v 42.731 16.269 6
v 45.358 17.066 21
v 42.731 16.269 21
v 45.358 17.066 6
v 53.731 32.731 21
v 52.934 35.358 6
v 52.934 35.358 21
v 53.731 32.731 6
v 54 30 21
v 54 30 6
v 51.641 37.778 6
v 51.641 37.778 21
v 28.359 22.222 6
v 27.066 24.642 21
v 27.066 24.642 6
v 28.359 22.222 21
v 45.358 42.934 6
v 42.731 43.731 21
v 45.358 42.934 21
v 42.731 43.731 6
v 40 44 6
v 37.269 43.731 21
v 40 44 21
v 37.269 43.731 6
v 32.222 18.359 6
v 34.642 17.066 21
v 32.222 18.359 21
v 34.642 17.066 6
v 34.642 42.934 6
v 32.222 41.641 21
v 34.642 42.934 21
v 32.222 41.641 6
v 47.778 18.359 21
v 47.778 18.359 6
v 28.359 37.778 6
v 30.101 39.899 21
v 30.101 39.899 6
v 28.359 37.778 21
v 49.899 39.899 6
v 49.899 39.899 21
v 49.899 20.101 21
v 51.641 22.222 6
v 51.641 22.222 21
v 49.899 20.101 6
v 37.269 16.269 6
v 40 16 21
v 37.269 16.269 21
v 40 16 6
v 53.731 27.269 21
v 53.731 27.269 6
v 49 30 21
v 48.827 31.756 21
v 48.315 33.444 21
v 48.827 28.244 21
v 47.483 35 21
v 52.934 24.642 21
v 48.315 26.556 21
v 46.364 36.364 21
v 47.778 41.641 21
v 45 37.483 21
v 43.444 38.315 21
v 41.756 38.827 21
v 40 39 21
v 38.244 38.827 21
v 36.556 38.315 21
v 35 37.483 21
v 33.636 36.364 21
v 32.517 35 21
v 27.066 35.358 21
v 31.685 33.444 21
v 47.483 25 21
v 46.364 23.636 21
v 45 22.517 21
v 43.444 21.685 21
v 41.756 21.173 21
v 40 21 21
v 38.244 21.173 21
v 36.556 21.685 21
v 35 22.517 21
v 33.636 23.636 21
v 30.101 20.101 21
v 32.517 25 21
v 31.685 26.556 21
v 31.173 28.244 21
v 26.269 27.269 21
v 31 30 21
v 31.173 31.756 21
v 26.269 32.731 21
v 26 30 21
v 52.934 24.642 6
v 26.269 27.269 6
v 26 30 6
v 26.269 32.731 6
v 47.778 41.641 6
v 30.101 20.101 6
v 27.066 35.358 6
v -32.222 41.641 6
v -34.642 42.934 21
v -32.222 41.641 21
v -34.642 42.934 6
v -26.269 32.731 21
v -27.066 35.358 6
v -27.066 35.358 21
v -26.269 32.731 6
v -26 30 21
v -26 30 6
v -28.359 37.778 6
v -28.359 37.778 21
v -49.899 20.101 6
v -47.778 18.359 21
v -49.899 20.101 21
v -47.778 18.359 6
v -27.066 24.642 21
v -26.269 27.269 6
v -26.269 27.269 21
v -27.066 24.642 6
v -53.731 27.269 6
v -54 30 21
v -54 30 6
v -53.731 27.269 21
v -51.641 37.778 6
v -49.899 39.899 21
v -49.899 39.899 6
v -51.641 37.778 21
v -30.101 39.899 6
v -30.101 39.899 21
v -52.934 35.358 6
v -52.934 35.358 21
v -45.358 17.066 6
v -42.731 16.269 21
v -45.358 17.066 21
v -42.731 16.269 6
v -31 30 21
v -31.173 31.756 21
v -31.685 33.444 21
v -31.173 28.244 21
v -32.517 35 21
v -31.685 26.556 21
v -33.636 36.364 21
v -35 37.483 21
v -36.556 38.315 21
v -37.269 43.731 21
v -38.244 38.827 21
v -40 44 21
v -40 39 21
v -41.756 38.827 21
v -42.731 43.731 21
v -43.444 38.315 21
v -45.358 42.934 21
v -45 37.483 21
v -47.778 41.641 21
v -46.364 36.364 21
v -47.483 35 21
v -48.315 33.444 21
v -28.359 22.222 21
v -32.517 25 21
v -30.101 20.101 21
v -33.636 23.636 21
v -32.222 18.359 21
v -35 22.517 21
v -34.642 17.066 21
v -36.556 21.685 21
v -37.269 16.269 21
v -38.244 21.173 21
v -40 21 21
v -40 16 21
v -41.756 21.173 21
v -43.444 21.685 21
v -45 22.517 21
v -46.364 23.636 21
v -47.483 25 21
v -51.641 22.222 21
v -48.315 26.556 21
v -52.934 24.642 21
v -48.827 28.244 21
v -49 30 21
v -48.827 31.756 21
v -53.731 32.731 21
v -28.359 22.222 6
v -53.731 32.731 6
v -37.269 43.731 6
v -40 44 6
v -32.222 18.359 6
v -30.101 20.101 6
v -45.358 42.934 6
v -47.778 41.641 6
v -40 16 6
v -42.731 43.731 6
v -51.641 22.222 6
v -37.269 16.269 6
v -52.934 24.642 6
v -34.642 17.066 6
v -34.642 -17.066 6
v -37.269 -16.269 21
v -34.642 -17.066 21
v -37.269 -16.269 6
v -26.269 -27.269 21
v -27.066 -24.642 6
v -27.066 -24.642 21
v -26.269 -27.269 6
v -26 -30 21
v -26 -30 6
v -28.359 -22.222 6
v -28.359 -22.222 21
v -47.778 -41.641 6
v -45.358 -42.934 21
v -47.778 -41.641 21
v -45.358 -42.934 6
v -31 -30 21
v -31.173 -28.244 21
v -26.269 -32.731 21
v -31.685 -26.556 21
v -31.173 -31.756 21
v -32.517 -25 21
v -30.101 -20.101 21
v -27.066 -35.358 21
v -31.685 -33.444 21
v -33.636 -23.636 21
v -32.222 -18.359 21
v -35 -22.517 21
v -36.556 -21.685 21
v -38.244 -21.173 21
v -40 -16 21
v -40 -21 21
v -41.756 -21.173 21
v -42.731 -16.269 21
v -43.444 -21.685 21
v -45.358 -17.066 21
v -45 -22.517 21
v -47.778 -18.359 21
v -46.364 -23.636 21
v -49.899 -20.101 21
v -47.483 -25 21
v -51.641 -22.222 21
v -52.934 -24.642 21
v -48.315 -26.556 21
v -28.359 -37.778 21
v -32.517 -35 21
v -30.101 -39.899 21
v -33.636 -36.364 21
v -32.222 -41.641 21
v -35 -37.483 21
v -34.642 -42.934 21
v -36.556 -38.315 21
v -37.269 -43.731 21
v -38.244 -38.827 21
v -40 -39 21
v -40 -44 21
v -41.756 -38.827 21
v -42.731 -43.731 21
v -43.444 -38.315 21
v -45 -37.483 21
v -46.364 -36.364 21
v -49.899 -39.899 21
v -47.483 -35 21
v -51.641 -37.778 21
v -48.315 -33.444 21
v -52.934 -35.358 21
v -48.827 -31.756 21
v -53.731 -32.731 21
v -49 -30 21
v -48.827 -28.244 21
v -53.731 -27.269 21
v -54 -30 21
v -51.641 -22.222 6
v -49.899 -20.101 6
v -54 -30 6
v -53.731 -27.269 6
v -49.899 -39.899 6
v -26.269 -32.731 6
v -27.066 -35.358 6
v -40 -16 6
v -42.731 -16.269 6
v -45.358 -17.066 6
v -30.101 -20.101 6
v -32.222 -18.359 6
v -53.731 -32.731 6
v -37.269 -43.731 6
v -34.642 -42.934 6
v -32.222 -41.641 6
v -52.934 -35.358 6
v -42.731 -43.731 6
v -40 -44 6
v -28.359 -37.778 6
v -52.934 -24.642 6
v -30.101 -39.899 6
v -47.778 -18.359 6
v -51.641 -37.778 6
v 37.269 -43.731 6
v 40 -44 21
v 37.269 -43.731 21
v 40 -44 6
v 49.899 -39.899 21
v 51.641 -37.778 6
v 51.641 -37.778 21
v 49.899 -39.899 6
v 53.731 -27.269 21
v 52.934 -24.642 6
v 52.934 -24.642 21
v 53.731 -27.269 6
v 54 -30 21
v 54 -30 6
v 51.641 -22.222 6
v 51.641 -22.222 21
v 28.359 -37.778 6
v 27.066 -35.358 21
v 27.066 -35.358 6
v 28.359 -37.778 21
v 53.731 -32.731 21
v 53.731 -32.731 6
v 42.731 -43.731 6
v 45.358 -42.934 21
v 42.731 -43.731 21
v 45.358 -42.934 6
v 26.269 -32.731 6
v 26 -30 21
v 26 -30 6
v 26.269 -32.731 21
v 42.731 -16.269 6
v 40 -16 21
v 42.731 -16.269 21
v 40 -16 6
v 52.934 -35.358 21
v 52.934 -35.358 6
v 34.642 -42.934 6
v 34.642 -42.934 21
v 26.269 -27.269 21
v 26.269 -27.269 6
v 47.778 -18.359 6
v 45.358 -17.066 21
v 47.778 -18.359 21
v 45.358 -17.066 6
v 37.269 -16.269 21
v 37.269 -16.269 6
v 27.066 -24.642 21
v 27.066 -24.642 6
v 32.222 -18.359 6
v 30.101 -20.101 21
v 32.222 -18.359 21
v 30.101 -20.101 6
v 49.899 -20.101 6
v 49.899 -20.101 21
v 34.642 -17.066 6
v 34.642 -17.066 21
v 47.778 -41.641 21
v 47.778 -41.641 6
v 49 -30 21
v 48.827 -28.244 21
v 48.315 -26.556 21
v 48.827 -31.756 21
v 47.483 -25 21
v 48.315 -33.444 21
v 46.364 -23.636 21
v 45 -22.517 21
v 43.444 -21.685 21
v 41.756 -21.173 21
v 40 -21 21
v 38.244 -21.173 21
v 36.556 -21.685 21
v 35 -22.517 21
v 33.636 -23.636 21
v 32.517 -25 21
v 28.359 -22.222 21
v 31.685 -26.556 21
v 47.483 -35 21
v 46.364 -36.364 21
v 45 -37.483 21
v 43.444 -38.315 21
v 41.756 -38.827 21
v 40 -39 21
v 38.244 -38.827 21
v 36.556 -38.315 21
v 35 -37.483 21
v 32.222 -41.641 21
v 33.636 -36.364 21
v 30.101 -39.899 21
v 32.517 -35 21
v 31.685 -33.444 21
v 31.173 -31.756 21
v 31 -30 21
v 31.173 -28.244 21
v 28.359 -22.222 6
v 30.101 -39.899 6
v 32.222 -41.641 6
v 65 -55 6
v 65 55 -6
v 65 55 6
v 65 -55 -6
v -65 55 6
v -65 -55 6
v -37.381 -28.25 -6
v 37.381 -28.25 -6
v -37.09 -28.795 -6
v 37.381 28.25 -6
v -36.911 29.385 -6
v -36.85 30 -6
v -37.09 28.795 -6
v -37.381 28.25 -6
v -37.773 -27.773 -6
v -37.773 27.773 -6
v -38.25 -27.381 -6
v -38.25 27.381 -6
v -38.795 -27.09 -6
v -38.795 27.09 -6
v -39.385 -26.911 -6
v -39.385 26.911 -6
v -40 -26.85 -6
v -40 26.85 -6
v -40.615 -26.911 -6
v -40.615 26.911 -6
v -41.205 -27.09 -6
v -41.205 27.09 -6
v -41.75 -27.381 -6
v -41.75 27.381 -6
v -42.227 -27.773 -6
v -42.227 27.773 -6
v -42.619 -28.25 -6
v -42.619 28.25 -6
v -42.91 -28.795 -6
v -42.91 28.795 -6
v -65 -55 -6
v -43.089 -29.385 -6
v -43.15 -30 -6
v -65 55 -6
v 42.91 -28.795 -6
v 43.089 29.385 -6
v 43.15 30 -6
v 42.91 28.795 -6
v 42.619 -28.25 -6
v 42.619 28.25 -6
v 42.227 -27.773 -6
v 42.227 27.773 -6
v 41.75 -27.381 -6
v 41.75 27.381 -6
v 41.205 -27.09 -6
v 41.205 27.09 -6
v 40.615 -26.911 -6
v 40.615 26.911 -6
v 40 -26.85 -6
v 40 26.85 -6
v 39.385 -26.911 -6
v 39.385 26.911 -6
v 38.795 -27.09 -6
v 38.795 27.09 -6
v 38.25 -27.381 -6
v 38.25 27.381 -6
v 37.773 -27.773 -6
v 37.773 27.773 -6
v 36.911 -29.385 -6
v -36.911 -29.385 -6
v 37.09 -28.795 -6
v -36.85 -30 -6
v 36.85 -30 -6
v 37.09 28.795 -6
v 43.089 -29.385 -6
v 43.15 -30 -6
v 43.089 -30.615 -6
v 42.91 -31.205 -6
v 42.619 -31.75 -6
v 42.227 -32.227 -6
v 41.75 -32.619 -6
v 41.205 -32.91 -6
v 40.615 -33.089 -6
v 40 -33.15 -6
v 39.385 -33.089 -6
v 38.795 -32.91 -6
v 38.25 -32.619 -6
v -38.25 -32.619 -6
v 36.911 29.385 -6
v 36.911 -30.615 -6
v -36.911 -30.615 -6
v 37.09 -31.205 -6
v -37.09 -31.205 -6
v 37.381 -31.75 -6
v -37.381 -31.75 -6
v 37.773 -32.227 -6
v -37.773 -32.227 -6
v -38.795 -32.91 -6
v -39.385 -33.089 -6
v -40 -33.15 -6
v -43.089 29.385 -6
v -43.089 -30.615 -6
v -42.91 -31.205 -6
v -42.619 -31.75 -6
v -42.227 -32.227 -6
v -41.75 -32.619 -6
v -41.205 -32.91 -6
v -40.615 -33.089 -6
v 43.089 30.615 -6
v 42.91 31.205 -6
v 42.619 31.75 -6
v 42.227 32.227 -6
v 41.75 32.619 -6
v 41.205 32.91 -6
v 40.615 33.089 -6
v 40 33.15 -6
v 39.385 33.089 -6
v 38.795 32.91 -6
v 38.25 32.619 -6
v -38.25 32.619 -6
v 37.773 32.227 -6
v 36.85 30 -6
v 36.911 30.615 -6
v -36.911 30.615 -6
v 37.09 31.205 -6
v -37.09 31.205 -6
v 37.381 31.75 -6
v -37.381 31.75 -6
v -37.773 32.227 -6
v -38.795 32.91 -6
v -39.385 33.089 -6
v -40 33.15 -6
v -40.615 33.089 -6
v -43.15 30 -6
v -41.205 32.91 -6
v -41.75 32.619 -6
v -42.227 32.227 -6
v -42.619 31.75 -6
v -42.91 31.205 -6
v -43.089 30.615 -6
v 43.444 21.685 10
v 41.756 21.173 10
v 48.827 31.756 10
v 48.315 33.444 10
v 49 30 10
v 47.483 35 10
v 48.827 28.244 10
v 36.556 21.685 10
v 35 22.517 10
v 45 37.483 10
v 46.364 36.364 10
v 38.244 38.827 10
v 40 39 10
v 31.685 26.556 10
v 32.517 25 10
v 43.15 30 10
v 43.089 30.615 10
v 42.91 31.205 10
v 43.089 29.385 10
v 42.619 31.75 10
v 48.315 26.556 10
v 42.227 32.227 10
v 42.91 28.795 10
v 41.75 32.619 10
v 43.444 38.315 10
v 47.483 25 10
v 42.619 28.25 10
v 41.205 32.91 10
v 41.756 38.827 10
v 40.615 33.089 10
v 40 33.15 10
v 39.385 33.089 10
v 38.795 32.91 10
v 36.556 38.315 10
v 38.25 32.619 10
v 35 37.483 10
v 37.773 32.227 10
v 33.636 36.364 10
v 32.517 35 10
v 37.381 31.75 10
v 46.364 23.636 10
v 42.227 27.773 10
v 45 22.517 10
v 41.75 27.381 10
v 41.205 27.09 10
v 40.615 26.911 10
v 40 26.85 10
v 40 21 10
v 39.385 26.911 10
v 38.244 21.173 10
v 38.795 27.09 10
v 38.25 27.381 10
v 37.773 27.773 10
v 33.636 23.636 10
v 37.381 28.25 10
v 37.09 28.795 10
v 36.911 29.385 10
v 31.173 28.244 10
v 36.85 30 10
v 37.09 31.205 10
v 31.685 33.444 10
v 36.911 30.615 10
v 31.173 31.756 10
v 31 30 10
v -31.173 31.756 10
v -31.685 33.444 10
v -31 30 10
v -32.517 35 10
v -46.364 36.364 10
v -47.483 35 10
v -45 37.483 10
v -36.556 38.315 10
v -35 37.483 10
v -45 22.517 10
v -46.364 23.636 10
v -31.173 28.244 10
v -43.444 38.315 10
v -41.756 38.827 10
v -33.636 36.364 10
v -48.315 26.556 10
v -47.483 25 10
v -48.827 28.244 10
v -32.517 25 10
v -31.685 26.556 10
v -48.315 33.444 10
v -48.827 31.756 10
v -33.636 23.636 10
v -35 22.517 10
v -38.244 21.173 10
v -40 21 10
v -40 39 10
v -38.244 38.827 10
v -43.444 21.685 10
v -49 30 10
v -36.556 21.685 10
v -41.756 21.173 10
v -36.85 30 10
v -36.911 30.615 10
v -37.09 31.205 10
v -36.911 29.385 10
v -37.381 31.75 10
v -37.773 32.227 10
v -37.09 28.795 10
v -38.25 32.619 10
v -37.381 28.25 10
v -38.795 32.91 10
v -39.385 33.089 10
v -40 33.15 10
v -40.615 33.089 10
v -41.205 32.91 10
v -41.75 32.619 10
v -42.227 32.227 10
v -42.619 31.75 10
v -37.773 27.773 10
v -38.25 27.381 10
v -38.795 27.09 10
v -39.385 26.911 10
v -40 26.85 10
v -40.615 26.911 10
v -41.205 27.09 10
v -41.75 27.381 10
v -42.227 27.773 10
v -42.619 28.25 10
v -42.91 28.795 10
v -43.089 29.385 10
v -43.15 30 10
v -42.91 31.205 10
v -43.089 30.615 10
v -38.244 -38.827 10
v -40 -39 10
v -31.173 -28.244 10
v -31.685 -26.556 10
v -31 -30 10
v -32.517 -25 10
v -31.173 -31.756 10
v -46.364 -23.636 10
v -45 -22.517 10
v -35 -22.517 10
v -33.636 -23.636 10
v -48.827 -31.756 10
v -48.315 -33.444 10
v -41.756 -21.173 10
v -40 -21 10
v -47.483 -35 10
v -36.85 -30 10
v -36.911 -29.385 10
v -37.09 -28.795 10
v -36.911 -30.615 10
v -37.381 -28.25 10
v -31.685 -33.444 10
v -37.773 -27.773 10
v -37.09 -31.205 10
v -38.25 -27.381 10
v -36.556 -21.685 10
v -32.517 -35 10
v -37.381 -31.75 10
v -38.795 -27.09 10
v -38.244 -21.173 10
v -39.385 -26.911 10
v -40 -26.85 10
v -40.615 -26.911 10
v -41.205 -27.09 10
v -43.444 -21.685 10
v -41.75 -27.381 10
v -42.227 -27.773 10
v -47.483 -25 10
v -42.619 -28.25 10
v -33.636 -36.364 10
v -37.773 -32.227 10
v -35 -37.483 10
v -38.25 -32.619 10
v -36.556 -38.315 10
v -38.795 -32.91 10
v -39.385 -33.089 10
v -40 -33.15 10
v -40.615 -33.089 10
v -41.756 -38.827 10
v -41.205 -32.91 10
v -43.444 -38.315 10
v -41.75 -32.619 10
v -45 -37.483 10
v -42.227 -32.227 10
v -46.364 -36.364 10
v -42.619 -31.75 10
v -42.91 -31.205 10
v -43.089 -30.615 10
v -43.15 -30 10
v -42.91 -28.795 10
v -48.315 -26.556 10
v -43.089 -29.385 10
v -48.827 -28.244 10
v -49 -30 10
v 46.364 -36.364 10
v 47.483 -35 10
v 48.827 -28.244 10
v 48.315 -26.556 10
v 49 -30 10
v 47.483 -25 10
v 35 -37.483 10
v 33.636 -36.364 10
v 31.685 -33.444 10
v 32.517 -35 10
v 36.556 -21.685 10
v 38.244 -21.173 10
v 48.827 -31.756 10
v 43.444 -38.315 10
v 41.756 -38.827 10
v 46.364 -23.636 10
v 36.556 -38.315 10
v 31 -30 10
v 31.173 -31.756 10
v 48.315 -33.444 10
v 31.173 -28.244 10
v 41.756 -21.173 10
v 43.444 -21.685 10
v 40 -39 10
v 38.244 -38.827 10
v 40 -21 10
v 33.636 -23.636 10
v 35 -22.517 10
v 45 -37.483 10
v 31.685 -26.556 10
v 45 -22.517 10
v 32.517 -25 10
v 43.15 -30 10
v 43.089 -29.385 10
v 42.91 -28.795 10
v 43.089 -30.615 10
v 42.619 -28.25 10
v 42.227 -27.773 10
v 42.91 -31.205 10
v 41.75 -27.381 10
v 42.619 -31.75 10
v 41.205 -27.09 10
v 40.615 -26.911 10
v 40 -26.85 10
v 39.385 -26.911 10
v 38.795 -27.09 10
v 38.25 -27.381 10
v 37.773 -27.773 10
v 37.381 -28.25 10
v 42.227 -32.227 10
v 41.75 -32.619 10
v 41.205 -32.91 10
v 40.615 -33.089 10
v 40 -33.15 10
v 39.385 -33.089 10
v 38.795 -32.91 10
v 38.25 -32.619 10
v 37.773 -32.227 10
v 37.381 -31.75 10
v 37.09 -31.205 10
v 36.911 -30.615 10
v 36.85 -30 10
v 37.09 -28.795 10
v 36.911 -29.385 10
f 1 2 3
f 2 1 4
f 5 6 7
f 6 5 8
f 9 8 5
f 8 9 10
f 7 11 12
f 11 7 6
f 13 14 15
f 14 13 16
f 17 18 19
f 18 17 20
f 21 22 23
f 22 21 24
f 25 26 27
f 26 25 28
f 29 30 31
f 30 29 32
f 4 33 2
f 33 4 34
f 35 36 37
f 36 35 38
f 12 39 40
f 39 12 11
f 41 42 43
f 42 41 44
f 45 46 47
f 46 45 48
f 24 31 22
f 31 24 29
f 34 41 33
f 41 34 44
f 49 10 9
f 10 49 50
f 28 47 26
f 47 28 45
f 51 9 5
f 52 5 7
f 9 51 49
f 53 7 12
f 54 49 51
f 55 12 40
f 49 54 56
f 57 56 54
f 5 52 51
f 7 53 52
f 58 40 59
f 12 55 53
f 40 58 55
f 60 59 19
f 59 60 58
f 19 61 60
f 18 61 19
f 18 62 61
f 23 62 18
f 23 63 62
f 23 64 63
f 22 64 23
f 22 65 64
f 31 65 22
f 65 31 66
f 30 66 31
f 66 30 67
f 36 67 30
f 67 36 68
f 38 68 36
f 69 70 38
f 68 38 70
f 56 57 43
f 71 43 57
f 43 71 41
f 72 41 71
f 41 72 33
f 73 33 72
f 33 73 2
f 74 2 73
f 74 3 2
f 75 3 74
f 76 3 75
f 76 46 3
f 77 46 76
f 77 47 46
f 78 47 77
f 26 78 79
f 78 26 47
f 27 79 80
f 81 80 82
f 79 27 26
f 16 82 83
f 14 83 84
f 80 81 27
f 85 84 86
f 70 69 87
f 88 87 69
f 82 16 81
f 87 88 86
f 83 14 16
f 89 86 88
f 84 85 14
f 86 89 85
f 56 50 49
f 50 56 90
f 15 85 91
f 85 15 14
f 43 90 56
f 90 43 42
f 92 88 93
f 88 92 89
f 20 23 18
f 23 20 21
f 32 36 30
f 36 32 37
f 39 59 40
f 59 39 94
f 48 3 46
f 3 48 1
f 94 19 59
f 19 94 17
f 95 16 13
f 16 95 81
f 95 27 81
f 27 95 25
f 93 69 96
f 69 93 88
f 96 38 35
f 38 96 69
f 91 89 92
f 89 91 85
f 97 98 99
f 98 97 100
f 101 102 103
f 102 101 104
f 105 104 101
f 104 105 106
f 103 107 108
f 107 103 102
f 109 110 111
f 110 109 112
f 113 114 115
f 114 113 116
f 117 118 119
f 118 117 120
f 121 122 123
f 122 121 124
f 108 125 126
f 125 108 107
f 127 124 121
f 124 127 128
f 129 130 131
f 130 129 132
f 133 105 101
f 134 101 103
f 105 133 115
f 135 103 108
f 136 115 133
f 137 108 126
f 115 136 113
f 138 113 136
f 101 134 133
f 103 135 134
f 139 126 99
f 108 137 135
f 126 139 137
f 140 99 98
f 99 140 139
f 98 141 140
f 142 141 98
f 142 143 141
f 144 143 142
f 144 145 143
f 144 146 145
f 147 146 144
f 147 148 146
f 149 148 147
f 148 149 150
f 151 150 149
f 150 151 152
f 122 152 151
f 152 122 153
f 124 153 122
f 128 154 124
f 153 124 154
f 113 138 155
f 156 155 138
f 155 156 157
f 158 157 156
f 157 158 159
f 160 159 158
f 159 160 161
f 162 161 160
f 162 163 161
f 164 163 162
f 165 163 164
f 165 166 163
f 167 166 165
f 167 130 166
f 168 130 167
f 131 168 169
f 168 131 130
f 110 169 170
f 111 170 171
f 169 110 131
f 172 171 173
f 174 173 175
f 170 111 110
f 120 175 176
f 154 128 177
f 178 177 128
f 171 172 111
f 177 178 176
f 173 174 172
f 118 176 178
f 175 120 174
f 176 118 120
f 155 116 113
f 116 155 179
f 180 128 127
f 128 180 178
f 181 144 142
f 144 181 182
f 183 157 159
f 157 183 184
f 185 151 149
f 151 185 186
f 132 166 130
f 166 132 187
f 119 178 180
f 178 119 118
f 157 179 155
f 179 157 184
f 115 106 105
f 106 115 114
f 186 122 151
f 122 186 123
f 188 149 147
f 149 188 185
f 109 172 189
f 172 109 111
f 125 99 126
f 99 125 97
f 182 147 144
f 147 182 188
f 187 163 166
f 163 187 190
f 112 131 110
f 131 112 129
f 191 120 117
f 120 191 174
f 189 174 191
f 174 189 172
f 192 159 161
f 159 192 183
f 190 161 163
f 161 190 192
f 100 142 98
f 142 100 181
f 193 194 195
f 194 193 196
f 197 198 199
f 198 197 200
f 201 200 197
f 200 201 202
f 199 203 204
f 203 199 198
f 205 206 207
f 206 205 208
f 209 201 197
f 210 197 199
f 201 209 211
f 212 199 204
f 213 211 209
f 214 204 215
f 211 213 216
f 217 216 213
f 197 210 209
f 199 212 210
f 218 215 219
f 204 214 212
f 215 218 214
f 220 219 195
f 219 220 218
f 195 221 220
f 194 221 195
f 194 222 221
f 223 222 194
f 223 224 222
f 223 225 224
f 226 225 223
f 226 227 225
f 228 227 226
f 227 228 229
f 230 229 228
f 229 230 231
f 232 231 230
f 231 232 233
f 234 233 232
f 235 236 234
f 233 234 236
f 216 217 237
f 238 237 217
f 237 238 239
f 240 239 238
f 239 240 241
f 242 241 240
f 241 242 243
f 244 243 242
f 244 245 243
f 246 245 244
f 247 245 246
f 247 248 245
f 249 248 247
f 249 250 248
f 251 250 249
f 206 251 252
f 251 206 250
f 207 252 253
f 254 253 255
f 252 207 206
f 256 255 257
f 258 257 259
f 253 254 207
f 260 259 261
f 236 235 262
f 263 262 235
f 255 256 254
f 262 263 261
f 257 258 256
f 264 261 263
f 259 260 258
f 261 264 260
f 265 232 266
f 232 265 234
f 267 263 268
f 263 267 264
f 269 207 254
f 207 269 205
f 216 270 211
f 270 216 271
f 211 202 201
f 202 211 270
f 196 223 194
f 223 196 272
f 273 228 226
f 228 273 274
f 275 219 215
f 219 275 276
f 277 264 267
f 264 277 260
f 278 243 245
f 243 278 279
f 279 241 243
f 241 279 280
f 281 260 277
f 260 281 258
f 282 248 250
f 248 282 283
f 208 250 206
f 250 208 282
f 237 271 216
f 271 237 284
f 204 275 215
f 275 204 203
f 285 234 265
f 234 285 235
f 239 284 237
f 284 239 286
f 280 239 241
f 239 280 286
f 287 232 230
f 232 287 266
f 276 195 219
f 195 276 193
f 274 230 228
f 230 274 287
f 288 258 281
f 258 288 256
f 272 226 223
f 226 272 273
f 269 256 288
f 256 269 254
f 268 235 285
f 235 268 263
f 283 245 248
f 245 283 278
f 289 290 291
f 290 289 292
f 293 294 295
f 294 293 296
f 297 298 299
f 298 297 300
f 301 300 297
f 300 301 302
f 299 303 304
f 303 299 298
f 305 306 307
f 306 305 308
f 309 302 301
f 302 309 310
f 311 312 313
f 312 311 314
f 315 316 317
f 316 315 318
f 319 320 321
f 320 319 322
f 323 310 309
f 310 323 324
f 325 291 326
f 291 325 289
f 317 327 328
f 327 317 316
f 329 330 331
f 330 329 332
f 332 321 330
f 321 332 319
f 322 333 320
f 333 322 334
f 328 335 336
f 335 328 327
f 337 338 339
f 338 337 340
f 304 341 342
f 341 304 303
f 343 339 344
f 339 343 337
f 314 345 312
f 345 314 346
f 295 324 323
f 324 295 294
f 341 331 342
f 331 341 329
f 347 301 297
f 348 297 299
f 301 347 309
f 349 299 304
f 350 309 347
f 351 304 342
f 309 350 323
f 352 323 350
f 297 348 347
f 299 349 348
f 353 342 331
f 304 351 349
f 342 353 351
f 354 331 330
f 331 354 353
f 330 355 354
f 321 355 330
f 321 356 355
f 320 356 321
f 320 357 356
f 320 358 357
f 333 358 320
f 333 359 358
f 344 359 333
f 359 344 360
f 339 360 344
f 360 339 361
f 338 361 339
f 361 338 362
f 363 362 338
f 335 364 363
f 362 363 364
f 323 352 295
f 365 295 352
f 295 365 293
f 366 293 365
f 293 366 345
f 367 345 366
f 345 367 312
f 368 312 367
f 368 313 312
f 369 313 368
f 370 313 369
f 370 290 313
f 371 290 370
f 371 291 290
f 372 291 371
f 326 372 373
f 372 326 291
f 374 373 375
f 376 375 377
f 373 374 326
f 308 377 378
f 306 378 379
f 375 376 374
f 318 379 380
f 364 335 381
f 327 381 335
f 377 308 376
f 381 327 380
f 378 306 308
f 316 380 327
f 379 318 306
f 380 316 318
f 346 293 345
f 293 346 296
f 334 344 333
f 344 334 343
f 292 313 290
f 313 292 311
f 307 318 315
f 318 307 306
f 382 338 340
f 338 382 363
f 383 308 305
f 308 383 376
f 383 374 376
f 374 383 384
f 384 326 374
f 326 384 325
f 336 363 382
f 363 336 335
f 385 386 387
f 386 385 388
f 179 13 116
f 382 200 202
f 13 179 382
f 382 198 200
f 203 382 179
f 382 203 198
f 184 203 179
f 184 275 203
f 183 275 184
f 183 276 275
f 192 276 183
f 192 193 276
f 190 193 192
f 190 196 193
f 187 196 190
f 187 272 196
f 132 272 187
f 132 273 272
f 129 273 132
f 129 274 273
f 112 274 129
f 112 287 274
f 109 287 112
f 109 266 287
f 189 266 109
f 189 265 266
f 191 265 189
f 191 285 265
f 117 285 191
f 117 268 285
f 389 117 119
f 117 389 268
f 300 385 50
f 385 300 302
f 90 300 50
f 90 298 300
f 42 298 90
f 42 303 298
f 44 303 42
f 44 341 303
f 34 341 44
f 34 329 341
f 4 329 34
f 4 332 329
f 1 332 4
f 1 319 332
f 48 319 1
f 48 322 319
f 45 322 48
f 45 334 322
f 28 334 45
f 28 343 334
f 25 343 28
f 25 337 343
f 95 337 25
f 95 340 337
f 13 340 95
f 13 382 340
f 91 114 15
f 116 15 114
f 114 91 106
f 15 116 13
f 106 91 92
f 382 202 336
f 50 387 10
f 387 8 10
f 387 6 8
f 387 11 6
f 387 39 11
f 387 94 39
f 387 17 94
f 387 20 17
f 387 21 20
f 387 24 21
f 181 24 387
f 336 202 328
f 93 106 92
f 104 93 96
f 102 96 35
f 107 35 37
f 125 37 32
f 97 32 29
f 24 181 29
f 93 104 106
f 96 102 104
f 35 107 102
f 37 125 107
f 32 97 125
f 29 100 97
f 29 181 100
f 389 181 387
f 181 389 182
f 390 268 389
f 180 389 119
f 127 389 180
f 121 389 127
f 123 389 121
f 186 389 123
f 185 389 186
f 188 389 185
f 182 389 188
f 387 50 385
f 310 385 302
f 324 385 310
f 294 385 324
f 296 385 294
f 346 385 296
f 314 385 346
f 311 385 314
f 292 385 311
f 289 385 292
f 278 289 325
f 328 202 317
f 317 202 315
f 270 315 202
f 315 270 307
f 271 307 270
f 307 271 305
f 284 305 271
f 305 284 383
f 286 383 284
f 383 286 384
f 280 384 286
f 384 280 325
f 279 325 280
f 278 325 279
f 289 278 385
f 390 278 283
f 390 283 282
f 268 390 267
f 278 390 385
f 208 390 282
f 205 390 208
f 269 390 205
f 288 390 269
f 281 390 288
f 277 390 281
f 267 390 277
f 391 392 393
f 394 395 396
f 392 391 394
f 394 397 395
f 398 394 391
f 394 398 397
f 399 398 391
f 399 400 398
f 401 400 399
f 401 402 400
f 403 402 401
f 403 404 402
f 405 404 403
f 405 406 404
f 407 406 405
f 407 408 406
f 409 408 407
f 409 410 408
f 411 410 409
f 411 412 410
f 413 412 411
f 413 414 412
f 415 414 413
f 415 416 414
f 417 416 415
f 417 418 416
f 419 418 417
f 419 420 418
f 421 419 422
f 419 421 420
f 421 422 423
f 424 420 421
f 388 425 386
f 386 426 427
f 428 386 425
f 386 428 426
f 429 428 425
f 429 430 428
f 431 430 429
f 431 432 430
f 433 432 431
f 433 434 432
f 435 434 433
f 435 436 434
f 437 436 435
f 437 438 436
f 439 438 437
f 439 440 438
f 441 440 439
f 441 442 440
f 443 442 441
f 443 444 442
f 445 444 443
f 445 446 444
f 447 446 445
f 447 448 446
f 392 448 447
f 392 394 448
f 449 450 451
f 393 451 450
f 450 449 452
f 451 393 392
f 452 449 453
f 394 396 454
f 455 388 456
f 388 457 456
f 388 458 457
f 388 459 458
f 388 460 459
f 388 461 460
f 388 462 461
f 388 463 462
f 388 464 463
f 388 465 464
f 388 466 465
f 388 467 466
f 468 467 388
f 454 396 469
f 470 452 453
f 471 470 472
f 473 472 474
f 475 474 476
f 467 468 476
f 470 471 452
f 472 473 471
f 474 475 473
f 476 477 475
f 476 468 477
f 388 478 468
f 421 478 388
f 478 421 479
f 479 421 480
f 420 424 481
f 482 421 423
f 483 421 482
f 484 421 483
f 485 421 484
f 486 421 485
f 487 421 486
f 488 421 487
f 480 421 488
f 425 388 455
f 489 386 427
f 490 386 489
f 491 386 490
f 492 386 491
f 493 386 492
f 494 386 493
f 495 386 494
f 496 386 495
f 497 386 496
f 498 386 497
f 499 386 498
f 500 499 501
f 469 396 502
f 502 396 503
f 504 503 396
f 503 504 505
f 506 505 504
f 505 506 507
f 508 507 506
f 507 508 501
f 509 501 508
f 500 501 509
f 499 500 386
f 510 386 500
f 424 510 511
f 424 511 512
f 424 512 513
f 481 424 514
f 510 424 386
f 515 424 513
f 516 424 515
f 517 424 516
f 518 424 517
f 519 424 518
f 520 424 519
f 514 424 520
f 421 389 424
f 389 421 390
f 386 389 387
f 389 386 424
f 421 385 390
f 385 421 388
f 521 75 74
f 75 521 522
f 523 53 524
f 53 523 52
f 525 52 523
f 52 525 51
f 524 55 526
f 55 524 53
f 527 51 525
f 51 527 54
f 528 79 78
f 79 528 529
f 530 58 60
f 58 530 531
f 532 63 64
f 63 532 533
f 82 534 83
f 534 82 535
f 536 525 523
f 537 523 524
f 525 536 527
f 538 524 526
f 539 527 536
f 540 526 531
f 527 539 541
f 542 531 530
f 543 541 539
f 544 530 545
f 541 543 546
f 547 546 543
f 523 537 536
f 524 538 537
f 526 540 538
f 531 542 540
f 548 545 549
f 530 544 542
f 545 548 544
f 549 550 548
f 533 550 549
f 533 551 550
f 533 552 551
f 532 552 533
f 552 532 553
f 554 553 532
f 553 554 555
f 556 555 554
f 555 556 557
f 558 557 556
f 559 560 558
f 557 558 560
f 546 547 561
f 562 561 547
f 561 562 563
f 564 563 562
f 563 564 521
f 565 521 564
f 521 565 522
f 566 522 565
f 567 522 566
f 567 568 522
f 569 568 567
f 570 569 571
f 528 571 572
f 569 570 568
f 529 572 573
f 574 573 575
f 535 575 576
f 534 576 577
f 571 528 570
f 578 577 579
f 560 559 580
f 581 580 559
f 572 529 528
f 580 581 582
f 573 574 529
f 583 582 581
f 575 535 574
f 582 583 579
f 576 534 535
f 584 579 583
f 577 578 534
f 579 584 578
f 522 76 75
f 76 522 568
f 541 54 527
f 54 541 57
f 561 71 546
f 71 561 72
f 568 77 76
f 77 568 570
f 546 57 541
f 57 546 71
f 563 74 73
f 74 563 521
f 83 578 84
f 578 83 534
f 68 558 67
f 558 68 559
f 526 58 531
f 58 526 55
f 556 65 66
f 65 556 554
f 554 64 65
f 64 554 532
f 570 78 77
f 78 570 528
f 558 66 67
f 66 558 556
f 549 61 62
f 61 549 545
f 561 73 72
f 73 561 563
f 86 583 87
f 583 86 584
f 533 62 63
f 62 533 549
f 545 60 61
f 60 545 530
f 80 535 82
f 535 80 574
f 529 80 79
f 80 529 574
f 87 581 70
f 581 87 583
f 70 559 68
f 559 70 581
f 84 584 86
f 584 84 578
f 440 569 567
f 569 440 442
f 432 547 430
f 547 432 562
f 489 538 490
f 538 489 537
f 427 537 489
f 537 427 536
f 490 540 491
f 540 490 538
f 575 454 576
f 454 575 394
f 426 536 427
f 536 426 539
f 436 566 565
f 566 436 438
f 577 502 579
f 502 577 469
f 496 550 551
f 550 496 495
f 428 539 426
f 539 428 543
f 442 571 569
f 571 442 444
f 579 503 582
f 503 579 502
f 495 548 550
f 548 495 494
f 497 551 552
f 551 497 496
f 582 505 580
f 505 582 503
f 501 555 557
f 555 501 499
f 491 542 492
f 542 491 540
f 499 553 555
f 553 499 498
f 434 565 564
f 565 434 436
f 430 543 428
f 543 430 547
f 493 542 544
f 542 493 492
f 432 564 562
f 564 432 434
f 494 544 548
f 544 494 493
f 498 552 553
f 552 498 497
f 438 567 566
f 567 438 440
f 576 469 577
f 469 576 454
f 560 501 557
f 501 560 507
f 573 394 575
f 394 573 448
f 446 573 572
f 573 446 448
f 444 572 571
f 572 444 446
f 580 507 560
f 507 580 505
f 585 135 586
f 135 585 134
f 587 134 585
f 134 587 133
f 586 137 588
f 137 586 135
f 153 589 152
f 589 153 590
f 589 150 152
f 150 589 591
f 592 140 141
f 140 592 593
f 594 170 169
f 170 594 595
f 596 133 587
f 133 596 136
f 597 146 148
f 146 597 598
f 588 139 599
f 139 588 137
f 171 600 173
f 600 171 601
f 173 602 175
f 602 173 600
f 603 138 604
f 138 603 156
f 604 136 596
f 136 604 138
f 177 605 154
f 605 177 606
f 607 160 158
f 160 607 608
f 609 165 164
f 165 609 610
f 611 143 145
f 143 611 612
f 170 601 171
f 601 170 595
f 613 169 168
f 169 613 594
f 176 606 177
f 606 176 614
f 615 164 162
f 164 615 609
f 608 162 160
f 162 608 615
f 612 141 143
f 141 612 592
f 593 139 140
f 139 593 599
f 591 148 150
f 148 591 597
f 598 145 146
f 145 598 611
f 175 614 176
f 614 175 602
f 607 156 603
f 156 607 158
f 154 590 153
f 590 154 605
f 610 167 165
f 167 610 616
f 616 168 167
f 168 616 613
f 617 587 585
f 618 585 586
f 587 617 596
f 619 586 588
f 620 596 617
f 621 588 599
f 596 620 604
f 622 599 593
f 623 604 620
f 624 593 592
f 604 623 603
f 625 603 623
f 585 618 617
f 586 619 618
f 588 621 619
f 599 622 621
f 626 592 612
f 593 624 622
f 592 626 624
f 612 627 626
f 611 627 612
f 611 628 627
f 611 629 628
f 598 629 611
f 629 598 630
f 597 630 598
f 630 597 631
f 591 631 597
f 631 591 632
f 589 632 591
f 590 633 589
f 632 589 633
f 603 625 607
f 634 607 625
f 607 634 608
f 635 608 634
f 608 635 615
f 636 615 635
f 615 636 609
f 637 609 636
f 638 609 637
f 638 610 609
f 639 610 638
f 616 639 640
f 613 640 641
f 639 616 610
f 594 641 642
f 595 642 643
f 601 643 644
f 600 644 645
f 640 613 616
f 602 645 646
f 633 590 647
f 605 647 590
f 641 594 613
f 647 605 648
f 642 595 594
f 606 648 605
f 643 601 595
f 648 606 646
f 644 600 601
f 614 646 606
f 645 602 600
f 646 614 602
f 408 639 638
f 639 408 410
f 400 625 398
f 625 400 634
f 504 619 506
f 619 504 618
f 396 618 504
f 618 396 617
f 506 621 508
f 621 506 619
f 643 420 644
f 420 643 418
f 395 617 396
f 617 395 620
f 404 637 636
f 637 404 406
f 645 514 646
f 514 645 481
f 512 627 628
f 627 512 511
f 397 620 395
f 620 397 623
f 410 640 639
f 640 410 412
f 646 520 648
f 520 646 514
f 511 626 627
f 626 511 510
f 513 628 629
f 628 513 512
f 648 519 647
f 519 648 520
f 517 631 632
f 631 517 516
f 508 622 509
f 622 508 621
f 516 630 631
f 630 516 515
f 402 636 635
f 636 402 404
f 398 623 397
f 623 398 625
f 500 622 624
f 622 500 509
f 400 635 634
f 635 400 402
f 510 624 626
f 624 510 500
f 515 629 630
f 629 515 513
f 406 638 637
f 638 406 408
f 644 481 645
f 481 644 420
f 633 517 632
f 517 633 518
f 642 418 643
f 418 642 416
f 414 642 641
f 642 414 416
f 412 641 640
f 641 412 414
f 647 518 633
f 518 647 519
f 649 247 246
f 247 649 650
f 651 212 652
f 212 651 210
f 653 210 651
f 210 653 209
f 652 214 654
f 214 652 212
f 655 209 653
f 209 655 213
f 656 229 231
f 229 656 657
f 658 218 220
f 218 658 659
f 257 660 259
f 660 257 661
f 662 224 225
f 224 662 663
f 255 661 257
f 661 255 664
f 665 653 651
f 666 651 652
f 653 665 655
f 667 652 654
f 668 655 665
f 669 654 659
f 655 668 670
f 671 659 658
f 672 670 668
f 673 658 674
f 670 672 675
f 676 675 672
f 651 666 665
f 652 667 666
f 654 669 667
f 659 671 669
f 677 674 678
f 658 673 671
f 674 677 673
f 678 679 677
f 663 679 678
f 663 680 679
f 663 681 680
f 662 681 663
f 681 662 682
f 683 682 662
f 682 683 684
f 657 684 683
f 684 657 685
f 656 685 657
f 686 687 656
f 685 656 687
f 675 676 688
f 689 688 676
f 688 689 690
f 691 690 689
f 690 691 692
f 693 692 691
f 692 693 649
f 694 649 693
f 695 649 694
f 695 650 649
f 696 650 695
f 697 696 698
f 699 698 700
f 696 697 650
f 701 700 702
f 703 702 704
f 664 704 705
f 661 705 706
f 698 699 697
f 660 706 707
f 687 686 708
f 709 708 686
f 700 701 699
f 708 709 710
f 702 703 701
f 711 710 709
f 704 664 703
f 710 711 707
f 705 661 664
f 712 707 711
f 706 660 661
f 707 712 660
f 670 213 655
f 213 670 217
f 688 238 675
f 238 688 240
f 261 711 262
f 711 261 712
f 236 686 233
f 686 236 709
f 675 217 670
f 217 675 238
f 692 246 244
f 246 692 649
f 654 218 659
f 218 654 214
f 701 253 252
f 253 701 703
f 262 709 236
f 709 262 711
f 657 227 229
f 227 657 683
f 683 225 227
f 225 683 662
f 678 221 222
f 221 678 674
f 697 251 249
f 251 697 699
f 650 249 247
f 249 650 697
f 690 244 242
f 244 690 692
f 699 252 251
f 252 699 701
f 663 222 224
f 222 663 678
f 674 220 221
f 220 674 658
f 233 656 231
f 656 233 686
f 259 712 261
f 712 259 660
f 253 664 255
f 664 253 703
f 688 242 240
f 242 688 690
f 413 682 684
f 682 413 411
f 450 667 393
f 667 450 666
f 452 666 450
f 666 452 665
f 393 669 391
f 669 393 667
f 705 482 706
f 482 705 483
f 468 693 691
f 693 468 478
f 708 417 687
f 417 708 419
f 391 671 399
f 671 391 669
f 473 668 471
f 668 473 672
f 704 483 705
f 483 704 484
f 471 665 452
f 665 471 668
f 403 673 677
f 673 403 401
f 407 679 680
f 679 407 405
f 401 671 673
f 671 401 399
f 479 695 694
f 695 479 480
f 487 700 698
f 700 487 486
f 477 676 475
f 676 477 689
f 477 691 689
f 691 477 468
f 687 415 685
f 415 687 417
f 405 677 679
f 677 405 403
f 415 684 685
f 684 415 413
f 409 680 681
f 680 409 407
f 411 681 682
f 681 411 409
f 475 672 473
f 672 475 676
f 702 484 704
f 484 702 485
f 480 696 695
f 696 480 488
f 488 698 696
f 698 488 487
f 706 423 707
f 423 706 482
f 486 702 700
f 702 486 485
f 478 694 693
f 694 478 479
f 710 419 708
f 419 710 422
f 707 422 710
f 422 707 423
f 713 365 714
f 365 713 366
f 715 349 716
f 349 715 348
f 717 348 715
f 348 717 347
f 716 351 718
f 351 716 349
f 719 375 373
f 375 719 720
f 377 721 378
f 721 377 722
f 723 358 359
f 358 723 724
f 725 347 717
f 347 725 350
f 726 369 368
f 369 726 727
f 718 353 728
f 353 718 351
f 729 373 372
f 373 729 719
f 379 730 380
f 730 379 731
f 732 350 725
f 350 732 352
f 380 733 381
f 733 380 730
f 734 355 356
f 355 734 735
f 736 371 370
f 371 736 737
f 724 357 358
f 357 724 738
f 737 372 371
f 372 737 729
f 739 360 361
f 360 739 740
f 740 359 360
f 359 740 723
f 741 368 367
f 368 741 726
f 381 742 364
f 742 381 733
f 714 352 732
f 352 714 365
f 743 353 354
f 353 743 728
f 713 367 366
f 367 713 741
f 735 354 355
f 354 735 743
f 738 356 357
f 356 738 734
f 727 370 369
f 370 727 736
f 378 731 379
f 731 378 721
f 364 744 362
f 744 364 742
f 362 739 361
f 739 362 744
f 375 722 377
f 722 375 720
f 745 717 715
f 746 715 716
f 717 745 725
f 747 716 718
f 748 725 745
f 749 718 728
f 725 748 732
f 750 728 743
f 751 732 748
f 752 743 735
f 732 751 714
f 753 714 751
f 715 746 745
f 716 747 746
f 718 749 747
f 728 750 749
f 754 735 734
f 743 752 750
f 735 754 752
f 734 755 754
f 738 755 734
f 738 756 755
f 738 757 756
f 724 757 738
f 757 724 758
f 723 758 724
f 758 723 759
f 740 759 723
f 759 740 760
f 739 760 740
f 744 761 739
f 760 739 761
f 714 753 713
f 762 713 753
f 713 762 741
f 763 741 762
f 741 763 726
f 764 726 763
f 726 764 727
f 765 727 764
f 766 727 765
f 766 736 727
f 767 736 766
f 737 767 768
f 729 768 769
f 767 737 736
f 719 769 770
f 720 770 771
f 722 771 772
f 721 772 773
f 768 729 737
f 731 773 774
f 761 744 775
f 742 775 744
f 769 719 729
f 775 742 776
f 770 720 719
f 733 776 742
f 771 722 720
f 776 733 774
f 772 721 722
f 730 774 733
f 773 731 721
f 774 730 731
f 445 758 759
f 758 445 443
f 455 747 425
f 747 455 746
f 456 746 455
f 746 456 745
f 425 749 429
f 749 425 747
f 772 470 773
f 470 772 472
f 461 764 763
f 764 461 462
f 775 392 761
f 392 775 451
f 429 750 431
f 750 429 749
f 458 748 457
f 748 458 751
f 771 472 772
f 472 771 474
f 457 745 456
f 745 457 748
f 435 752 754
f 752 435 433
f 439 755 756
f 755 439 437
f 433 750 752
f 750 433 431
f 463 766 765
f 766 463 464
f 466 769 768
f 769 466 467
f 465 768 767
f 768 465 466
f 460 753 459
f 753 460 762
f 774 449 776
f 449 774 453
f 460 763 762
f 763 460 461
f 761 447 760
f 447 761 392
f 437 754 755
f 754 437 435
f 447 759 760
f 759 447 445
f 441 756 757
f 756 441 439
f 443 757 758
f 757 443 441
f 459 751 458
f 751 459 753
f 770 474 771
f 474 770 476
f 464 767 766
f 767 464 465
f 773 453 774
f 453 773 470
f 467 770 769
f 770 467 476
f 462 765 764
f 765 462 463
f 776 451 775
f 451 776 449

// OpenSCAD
$fn = 32;

// ----------------------------------------------------------------------
// Socket pad plate
// bosses with counterbored sockets for the screws
// ----------------------------------------------------------------------

// --- parameters (mm) ---
base_t = 12;             // base plate thickness
boss_h = 15;             // boss height above the base plate
boss_d = 28;             // boss diameter
socket_d = 18;           // socket diameter
socket_depth = 11;       // socket depth from the boss face
bolt_d = 6.3;            // screw clearance hole through the socket floor
plate = [130, 110, 12];  // overall size (x, y, z)
edge = 25;               // boss centre offset from the plate edge
pads = 4;                // boss count, one per corner

// --- derived feature positions (mm) ---
height = base_t + boss_h;        // = 27   overall height of the part
corner_x = plate[0] / 2 - edge;  // = 40   boss centre X
corner_y = plate[1] / 2 - edge;  // = 30   boss centre Y
feature_centers = [
  [corner_x, corner_y],
  [-corner_x, corner_y],
  [-corner_x, -corner_y],
  [corner_x, -corner_y]
];   // boss centres: sockets, holes and the pads themselves are placed from here

// base plate, bosses on feature_centers, socket + through hole in each
difference() {
  union() {
    cube(plate, center = true);
    for (centre = feature_centers)
      translate([centre[0], centre[1], plate[2] / 2 - 1])
        cylinder(d = boss_d, h = boss_h + 1);
  }
  for (centre = feature_centers) {
    translate([centre[0], centre[1], plate[2] / 2 + boss_h - socket_depth])
      cylinder(d = socket_d, h = socket_depth + 1);
    translate([centre[0], centre[1], -height])
      cylinder(d = bolt_d, h = 2 * height + 2);  // through the socket floor
  }
}
